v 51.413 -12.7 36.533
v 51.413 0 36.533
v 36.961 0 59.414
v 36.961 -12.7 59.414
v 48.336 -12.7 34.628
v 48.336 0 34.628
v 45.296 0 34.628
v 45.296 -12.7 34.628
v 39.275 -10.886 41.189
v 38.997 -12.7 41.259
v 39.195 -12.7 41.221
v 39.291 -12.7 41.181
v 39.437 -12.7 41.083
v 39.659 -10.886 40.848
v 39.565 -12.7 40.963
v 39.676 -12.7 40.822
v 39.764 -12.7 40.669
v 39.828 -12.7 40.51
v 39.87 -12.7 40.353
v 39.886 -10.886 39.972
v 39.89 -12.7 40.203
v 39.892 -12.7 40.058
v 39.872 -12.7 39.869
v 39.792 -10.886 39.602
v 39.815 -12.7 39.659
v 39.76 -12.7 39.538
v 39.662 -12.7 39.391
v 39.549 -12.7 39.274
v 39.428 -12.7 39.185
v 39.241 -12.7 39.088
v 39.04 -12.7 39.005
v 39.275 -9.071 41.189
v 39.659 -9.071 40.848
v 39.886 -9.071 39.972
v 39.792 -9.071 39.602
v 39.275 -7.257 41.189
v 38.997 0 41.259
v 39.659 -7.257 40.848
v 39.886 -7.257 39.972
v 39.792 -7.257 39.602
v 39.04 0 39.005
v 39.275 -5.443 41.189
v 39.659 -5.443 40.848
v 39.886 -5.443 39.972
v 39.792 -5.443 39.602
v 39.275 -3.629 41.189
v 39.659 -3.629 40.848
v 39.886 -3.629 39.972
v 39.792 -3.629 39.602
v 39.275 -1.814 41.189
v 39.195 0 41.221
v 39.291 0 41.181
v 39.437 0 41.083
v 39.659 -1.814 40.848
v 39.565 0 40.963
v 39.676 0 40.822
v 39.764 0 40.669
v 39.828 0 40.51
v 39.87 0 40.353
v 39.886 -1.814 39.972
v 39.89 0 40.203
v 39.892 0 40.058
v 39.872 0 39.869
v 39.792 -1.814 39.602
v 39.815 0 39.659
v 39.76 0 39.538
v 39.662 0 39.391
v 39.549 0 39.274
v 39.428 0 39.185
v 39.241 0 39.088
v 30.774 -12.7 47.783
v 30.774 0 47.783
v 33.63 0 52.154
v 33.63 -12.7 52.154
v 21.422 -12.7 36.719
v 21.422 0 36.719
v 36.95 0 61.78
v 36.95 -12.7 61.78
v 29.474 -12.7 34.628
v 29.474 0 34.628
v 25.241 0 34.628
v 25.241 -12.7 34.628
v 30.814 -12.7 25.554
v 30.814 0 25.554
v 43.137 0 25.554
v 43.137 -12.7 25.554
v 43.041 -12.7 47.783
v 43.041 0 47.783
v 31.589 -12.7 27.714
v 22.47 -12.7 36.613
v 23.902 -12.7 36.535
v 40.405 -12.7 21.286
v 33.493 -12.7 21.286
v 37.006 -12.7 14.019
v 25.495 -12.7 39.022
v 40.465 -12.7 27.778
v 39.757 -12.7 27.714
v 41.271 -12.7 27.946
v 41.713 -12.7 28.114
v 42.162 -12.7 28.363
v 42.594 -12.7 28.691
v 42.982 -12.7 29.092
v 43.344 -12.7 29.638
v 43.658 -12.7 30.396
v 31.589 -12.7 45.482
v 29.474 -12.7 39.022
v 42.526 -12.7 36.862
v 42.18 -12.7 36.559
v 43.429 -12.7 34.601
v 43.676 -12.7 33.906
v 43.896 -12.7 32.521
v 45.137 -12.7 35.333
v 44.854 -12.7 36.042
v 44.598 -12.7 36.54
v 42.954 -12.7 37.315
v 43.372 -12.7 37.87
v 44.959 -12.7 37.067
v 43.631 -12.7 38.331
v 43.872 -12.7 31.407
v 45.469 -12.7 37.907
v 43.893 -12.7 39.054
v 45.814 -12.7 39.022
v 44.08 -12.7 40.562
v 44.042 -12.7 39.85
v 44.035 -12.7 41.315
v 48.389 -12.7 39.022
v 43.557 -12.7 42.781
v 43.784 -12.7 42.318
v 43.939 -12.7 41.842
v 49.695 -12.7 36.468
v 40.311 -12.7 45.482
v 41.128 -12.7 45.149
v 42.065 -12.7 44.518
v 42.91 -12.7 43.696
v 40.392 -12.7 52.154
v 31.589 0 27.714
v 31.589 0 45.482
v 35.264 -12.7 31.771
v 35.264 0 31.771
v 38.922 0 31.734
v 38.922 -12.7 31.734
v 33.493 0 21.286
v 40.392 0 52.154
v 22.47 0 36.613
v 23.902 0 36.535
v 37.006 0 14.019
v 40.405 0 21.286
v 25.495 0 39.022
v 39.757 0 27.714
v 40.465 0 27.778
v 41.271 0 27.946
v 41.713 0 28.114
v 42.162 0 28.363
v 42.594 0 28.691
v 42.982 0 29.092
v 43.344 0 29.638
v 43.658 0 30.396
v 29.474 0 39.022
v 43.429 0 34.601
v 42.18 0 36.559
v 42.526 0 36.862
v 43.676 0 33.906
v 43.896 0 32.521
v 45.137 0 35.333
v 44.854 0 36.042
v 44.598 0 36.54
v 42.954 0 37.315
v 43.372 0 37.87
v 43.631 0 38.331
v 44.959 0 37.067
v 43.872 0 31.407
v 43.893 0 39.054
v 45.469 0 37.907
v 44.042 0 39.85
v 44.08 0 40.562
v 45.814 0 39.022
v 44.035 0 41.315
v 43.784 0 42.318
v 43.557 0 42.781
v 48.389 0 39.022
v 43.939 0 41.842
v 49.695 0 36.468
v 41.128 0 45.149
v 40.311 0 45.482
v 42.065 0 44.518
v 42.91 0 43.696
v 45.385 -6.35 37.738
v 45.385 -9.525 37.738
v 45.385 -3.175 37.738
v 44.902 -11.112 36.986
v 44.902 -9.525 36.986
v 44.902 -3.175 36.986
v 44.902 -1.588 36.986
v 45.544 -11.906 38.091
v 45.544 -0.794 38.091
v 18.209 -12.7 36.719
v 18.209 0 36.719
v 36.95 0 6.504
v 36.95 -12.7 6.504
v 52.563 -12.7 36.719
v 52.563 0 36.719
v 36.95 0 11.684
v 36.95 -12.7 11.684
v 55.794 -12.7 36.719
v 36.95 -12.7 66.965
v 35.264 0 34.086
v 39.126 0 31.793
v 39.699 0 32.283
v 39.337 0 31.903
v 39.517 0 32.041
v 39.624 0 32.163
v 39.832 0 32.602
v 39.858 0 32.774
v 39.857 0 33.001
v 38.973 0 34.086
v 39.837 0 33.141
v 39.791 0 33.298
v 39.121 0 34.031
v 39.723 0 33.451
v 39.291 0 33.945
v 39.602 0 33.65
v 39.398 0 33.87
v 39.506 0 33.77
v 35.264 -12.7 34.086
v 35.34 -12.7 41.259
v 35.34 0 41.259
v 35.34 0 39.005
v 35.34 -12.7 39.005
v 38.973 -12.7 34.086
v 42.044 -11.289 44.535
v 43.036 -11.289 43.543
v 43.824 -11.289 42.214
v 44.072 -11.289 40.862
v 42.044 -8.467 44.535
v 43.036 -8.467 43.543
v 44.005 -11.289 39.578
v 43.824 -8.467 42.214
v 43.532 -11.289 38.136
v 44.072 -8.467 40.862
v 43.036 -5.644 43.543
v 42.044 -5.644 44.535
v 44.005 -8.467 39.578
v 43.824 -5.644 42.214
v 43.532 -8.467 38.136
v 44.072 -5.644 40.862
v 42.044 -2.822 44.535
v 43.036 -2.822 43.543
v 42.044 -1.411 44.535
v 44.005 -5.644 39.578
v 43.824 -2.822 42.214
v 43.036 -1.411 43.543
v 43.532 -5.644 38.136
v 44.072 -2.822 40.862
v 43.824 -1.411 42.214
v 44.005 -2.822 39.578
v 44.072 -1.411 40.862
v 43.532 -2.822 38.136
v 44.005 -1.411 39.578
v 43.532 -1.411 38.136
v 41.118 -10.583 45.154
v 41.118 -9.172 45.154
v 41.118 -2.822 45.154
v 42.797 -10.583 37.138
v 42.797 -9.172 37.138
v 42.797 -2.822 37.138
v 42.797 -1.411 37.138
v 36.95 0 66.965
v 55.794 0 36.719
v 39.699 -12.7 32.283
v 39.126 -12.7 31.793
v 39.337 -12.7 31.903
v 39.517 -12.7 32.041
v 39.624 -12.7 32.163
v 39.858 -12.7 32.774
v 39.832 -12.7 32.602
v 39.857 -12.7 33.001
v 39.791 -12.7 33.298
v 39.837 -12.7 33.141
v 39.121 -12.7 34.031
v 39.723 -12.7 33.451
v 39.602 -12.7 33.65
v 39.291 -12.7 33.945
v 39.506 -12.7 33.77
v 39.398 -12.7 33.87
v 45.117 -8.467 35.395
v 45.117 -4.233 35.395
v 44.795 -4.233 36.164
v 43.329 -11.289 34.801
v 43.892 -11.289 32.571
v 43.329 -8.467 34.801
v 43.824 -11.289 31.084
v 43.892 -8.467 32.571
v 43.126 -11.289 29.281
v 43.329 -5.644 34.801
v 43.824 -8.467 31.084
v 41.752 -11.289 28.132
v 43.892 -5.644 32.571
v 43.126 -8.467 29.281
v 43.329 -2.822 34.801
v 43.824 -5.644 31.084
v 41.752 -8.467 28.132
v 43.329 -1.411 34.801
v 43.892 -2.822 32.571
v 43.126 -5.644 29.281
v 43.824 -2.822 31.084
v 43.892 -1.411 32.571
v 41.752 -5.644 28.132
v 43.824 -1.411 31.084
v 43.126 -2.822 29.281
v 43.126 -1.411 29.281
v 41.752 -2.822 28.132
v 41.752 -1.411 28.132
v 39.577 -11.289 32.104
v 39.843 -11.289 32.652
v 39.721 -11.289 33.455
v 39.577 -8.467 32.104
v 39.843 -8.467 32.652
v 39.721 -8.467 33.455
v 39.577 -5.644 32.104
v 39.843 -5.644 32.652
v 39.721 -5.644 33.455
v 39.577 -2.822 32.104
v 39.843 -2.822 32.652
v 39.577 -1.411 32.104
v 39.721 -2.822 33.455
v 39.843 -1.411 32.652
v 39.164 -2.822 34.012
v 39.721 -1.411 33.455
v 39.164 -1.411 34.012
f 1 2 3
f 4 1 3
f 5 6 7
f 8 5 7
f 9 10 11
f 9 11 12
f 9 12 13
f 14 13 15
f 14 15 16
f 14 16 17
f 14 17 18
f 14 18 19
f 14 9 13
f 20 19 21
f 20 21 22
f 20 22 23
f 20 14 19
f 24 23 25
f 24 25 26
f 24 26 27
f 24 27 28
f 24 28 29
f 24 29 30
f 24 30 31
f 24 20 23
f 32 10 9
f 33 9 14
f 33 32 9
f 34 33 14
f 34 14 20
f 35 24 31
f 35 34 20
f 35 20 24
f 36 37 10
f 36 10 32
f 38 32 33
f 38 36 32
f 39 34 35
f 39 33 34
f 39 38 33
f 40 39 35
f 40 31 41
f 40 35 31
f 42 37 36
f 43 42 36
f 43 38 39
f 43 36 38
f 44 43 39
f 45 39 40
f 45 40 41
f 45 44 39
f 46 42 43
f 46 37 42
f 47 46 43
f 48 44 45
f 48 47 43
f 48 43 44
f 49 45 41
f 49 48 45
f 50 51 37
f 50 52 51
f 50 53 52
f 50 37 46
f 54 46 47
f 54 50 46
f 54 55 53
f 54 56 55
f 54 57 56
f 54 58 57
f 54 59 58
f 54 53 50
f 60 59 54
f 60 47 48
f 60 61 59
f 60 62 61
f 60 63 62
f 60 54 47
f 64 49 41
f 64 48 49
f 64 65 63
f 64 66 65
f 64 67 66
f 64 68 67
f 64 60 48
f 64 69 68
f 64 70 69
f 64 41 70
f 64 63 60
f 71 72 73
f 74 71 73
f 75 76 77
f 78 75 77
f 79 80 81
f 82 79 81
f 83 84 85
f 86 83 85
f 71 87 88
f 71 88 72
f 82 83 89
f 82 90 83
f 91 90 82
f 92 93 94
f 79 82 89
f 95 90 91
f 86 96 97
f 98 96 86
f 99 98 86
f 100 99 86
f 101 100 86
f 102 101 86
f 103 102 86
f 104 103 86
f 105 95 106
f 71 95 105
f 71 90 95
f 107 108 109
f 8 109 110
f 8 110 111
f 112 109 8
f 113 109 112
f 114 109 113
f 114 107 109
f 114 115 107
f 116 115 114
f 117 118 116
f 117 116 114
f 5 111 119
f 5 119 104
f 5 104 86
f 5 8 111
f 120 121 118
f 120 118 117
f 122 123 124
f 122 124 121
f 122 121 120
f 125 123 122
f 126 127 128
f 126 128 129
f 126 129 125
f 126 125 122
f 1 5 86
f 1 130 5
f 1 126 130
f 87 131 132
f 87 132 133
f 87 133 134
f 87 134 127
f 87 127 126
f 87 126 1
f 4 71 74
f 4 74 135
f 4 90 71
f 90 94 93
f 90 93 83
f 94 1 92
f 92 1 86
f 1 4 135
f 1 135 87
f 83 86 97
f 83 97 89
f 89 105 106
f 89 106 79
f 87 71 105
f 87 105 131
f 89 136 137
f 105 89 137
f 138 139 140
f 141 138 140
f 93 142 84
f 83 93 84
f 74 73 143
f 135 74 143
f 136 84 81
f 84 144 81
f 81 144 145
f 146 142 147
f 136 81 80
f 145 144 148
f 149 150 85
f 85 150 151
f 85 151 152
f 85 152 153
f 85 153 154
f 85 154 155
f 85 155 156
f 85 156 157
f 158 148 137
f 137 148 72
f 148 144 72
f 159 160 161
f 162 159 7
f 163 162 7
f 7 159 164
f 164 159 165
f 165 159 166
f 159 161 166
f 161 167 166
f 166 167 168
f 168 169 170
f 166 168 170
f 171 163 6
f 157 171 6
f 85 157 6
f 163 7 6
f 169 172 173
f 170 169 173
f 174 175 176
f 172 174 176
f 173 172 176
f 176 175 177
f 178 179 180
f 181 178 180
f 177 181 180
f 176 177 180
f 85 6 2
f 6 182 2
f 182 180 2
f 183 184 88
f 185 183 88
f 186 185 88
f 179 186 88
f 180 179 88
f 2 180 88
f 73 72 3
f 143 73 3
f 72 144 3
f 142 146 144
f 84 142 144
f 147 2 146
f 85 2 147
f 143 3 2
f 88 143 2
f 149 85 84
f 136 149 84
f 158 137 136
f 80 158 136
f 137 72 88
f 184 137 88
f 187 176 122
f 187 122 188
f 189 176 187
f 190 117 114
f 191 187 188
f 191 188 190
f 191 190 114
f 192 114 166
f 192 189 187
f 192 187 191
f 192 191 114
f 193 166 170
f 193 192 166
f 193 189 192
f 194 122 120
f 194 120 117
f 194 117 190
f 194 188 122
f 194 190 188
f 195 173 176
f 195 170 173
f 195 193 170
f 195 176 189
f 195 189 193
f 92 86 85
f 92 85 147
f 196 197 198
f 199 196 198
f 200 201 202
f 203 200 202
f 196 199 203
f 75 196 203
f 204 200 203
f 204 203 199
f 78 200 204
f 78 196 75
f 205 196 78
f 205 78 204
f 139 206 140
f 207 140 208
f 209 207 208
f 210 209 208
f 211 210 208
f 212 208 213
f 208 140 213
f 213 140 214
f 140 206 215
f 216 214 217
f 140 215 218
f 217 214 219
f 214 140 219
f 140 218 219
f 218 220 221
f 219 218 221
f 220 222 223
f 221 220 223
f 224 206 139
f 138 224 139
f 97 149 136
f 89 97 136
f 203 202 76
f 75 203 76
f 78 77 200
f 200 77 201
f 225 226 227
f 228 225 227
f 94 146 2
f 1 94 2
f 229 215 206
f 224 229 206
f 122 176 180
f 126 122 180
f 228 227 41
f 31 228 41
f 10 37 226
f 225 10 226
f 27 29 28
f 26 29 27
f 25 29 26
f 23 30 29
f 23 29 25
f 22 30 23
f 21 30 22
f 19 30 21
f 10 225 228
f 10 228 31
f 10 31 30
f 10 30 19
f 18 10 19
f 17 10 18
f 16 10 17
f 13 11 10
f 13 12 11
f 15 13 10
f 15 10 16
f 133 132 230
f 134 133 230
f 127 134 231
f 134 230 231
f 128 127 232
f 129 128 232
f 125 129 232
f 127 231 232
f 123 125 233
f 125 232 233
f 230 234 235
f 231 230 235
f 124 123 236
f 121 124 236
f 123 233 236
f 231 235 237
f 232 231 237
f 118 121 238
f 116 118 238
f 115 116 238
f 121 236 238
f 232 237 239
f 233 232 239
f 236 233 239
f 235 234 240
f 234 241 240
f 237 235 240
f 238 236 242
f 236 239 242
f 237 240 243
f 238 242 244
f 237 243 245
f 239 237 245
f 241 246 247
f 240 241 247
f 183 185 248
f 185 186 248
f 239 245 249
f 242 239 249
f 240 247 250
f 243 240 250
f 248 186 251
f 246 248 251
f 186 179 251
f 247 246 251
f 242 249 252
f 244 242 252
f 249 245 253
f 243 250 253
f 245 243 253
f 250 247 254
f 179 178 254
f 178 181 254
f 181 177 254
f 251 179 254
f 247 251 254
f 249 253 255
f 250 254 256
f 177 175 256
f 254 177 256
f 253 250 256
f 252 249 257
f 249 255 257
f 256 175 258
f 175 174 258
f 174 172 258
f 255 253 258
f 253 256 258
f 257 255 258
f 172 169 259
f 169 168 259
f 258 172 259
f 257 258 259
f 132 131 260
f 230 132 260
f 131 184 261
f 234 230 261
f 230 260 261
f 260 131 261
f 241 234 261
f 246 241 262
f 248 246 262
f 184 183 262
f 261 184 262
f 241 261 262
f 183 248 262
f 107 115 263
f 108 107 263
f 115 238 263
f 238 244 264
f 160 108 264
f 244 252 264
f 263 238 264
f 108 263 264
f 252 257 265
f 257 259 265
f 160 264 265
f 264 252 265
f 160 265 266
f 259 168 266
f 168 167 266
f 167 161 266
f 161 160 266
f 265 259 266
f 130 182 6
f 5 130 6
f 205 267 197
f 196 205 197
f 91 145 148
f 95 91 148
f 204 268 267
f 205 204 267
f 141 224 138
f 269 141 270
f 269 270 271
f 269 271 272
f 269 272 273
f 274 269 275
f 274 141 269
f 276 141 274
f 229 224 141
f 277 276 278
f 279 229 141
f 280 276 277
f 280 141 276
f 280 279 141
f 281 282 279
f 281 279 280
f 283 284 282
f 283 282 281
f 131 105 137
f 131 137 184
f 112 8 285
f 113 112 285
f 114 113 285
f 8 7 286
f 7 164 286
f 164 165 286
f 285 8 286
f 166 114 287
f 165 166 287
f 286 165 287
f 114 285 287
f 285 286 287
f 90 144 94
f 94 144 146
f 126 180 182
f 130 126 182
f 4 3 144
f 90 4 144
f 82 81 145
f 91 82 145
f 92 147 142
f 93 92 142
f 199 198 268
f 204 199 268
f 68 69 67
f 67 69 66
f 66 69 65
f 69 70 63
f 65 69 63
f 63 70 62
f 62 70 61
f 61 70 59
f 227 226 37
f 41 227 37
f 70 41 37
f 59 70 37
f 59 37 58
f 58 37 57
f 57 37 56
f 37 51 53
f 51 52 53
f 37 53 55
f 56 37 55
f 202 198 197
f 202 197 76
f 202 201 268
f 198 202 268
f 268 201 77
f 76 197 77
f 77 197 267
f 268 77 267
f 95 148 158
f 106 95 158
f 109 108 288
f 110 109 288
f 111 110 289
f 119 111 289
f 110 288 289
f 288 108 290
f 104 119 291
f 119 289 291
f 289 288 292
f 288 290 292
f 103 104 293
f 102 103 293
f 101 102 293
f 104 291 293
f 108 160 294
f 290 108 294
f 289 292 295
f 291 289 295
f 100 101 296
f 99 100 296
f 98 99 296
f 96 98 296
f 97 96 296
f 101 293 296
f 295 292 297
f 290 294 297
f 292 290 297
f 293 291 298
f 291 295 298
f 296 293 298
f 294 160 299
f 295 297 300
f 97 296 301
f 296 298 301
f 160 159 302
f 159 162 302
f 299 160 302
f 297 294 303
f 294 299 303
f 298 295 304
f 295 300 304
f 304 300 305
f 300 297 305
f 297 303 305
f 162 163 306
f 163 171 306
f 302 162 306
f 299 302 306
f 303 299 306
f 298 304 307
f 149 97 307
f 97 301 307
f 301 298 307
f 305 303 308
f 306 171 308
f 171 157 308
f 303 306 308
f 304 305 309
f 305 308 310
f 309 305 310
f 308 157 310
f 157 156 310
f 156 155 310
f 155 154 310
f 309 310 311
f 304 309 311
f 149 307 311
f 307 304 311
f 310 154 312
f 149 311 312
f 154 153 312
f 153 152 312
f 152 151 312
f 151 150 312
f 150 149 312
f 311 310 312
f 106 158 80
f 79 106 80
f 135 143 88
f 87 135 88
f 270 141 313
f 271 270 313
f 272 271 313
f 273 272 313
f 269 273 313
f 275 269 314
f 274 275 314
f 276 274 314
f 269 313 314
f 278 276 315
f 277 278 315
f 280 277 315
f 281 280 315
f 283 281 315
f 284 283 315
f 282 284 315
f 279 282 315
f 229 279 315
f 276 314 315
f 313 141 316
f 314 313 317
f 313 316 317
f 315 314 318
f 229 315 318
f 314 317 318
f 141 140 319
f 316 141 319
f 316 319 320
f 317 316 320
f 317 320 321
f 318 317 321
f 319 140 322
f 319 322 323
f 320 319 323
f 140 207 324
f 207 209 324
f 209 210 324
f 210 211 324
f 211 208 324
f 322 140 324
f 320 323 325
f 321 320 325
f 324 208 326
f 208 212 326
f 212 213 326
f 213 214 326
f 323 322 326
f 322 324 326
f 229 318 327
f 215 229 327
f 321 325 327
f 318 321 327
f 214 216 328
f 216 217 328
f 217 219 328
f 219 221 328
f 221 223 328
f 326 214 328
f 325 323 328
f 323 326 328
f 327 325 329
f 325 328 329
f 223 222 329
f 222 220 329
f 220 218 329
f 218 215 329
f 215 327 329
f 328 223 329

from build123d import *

# Parameters (mm, degrees)
F1_DEPTH = 12.7


with BuildPart() as f1:
    # F0 (on Front) → F1 (new body)
    with BuildSketch(Plane.XZ):
        Polygon((55.7935386896, 36.7190510854), (36.9497281499, 66.9649243355), (18.2089805603, 36.7190510854), (36.9497281499, 6.503792014), align=None)
        Polygon((36.9497281499, 11.6835868778), (21.4217025787, 36.7190510854), (36.9497281499, 61.7798812901), (52.5631486136, 36.7190510854), align=None, mode=Mode.SUBTRACT)
    extrude(amount=F1_DEPTH)


with BuildPart() as f1b:
    # F0 (on Front) → F1, piece 2 (new body)
    with BuildSketch(Plane.XZ):
        Polygon((36.961235106, 59.4144389033), (22.4695149809, 36.6130620241), (37.0061062276, 14.0193393454), (51.4128133655, 36.5327745676), align=None)
        Polygon((40.4053814709, 21.2857276201), (33.4929376841, 21.2857276201), (30.8136940002, 25.5541232933), (43.1367961042, 25.5541232933), align=None, mode=Mode.SUBTRACT)
        with BuildLine():
            Line((31.5892696381, 45.4823561013), (40.3105765581, 45.4823561013))
            add(Edge.make_bspline(
                [(40.3105765581, 45.4823561013), (40.5333300825, 45.4085817866), (41.042455534, 45.2399632142), (42.1005544789, 44.5479394631), (43.0744390966, 43.5826743272), (43.925763597, 42.2555841719), (44.1100589755, 40.8619686909), (44.0575175742, 39.5641218576), (43.6479933041, 38.1108548902), (42.6901208937, 36.9863822802), (42.3252794068, 36.6807332491), (42.1796739101, 36.5587510169)],
                knots=[0, 0, 0, 0, 0.0870043531, 0.1988571479, 0.3179186916, 0.442930924, 0.5608163005, 0.6748511408, 0.7987301676, 0.9196747219, 1, 1, 1, 1], degree=3))
            add(Edge.make_bspline(
                [(42.1796739101, 36.5587510169), (42.3264358464, 36.3407158161), (42.6522921404, 35.8566111205), (43.3808372382, 34.8074425703), (43.7226515634, 33.8670891114), (43.936391539, 32.5382323001), (43.906838669, 31.0661385984), (43.295675562, 29.1766064867), (41.8275926432, 28.0438558863), (40.6063341243, 27.773352256), (40.021191355, 27.7321808996), (39.7569350898, 27.7135875076)],
                knots=[0, 0, 0, 0, 0.0905041515, 0.2009468405, 0.3001036028, 0.412460378, 0.5326837088, 0.6696877281, 0.8015789922, 0.9103911093, 1, 1, 1, 1], degree=3))
            Line((39.7569350898, 27.7135875076), (31.5892696381, 27.7135875076))
            Line((31.5892696381, 27.7135875076), (31.5892696381, 45.4823561013))
        make_face(mode=Mode.SUBTRACT)
        Polygon((29.474074021, 34.628354013), (25.2408720553, 34.628354013), (23.9017345011, 36.5349836648), (25.4948213696, 39.0223115683), (29.474074021, 39.0223115683), align=None, mode=Mode.SUBTRACT)
        Polygon((43.0411249399, 47.7829612792), (30.7743567973, 47.7829612792), (33.6297526956, 52.1540269256), (40.3920710087, 52.1540269256), align=None, mode=Mode.SUBTRACT)
        with BuildLine():
            Line((48.335775733, 34.628354013), (45.2958680689, 34.628354013))
            add(Edge.make_bspline(
                [(45.2958680689, 34.628354013), (45.2493090735, 34.8795872134), (45.154844931, 35.3893174737), (44.8068270324, 36.1568551796), (44.6597168136, 36.4270999952), (44.5984788239, 36.5395955741)],
                knots=[0, 0, 0, 0, 0.3619699152, 0.7344053999, 1, 1, 1, 1], degree=3))
            add(Edge.make_bspline(
                [(45.8144433796, 39.0223115683), (45.7619252527, 38.826735599), (45.6512299545, 38.4145095445), (45.4449422066, 37.7343205226), (44.7815224594, 36.8240355108), (44.6459435385, 36.6133531805), (44.5984788239, 36.5395955741)],
                knots=[0, 0, 0, 0, 0.2388838223, 0.50350836, 0.8261836438, 1, 1, 1, 1], degree=3))
            Line((45.8144433796, 39.0223115683), (48.3894199133, 39.0223115683))
            Line((48.3894199133, 39.0223115683), (49.6947914362, 36.4680700004))
            Line((49.6947914362, 36.4680700004), (48.335775733, 34.628354013))
        make_face(mode=Mode.SUBTRACT)
    extrude(amount=F1_DEPTH)


with BuildPart() as f1c:
    # F0 (on Front) → F1, piece 3 (new body)
    with BuildSketch(Plane.XZ):
        with BuildLine():
            Line((35.2640636265, 34.0863354504), (35.2640636265, 31.7708700895))
            Line((35.2640636265, 31.7708700895), (38.922406733, 31.7344889045))
            add(Edge.make_bspline(
                [(38.922406733, 31.7344889045), (38.9920509714, 31.7500054339), (39.1644750388, 31.7884210038), (39.6172983515, 32.0634365037), (39.7839162385, 32.4707960681), (39.8572192368, 32.6461160883), (39.877484768, 33.0735684697), (39.7405030799, 33.4586486799), (39.4774261787, 33.8440447349), (39.1729432343, 34.0160993046), (39.0337644154, 34.0649864326), (38.9729849994, 34.0863354504)],
                knots=[0, 0, 0, 0, 0.0923737548, 0.2286974329, 0.3512949974, 0.4338000293, 0.553394417, 0.6761573175, 0.8042086158, 0.9144978662, 1, 1, 1, 1], degree=3))
            Line((38.9729849994, 34.0863354504), (35.2640636265, 34.0863354504))
        make_face()
    extrude(amount=F1_DEPTH)


with BuildPart() as f1d:
    # F0 (on Front) → F1, piece 4 (new body)
    with BuildSketch(Plane.XZ):
        with BuildLine():
            Line((35.3397987783, 41.2588343024), (35.3397987783, 39.0047281981))
            Line((35.3397987783, 39.0047281981), (39.0399359167, 39.0047281981))
            add(Edge.make_bspline(
                [(38.9974042773, 41.2588343024), (39.0873141247, 41.2475297089), (39.2975489241, 41.2210963534), (39.7001234425, 40.867086274), (39.892596456, 40.3749429327), (39.9017244721, 39.9722490655), (39.8167501853, 39.5886572913), (39.5394832868, 39.2041753541), (39.2112330081, 39.0731195454), (39.0399359167, 39.0047281981)],
                knots=[0, 0, 0, 0, 0.1157876497, 0.2707444625, 0.4276274278, 0.5633144477, 0.6968842221, 0.8418193236, 1, 1, 1, 1], degree=3))
            Line((38.9974042773, 41.2588343024), (35.3397987783, 41.2588343024))
        make_face()
    extrude(amount=F1_DEPTH)


solid = Compound([f1.part, f1b.part, f1c.part, f1d.part])
